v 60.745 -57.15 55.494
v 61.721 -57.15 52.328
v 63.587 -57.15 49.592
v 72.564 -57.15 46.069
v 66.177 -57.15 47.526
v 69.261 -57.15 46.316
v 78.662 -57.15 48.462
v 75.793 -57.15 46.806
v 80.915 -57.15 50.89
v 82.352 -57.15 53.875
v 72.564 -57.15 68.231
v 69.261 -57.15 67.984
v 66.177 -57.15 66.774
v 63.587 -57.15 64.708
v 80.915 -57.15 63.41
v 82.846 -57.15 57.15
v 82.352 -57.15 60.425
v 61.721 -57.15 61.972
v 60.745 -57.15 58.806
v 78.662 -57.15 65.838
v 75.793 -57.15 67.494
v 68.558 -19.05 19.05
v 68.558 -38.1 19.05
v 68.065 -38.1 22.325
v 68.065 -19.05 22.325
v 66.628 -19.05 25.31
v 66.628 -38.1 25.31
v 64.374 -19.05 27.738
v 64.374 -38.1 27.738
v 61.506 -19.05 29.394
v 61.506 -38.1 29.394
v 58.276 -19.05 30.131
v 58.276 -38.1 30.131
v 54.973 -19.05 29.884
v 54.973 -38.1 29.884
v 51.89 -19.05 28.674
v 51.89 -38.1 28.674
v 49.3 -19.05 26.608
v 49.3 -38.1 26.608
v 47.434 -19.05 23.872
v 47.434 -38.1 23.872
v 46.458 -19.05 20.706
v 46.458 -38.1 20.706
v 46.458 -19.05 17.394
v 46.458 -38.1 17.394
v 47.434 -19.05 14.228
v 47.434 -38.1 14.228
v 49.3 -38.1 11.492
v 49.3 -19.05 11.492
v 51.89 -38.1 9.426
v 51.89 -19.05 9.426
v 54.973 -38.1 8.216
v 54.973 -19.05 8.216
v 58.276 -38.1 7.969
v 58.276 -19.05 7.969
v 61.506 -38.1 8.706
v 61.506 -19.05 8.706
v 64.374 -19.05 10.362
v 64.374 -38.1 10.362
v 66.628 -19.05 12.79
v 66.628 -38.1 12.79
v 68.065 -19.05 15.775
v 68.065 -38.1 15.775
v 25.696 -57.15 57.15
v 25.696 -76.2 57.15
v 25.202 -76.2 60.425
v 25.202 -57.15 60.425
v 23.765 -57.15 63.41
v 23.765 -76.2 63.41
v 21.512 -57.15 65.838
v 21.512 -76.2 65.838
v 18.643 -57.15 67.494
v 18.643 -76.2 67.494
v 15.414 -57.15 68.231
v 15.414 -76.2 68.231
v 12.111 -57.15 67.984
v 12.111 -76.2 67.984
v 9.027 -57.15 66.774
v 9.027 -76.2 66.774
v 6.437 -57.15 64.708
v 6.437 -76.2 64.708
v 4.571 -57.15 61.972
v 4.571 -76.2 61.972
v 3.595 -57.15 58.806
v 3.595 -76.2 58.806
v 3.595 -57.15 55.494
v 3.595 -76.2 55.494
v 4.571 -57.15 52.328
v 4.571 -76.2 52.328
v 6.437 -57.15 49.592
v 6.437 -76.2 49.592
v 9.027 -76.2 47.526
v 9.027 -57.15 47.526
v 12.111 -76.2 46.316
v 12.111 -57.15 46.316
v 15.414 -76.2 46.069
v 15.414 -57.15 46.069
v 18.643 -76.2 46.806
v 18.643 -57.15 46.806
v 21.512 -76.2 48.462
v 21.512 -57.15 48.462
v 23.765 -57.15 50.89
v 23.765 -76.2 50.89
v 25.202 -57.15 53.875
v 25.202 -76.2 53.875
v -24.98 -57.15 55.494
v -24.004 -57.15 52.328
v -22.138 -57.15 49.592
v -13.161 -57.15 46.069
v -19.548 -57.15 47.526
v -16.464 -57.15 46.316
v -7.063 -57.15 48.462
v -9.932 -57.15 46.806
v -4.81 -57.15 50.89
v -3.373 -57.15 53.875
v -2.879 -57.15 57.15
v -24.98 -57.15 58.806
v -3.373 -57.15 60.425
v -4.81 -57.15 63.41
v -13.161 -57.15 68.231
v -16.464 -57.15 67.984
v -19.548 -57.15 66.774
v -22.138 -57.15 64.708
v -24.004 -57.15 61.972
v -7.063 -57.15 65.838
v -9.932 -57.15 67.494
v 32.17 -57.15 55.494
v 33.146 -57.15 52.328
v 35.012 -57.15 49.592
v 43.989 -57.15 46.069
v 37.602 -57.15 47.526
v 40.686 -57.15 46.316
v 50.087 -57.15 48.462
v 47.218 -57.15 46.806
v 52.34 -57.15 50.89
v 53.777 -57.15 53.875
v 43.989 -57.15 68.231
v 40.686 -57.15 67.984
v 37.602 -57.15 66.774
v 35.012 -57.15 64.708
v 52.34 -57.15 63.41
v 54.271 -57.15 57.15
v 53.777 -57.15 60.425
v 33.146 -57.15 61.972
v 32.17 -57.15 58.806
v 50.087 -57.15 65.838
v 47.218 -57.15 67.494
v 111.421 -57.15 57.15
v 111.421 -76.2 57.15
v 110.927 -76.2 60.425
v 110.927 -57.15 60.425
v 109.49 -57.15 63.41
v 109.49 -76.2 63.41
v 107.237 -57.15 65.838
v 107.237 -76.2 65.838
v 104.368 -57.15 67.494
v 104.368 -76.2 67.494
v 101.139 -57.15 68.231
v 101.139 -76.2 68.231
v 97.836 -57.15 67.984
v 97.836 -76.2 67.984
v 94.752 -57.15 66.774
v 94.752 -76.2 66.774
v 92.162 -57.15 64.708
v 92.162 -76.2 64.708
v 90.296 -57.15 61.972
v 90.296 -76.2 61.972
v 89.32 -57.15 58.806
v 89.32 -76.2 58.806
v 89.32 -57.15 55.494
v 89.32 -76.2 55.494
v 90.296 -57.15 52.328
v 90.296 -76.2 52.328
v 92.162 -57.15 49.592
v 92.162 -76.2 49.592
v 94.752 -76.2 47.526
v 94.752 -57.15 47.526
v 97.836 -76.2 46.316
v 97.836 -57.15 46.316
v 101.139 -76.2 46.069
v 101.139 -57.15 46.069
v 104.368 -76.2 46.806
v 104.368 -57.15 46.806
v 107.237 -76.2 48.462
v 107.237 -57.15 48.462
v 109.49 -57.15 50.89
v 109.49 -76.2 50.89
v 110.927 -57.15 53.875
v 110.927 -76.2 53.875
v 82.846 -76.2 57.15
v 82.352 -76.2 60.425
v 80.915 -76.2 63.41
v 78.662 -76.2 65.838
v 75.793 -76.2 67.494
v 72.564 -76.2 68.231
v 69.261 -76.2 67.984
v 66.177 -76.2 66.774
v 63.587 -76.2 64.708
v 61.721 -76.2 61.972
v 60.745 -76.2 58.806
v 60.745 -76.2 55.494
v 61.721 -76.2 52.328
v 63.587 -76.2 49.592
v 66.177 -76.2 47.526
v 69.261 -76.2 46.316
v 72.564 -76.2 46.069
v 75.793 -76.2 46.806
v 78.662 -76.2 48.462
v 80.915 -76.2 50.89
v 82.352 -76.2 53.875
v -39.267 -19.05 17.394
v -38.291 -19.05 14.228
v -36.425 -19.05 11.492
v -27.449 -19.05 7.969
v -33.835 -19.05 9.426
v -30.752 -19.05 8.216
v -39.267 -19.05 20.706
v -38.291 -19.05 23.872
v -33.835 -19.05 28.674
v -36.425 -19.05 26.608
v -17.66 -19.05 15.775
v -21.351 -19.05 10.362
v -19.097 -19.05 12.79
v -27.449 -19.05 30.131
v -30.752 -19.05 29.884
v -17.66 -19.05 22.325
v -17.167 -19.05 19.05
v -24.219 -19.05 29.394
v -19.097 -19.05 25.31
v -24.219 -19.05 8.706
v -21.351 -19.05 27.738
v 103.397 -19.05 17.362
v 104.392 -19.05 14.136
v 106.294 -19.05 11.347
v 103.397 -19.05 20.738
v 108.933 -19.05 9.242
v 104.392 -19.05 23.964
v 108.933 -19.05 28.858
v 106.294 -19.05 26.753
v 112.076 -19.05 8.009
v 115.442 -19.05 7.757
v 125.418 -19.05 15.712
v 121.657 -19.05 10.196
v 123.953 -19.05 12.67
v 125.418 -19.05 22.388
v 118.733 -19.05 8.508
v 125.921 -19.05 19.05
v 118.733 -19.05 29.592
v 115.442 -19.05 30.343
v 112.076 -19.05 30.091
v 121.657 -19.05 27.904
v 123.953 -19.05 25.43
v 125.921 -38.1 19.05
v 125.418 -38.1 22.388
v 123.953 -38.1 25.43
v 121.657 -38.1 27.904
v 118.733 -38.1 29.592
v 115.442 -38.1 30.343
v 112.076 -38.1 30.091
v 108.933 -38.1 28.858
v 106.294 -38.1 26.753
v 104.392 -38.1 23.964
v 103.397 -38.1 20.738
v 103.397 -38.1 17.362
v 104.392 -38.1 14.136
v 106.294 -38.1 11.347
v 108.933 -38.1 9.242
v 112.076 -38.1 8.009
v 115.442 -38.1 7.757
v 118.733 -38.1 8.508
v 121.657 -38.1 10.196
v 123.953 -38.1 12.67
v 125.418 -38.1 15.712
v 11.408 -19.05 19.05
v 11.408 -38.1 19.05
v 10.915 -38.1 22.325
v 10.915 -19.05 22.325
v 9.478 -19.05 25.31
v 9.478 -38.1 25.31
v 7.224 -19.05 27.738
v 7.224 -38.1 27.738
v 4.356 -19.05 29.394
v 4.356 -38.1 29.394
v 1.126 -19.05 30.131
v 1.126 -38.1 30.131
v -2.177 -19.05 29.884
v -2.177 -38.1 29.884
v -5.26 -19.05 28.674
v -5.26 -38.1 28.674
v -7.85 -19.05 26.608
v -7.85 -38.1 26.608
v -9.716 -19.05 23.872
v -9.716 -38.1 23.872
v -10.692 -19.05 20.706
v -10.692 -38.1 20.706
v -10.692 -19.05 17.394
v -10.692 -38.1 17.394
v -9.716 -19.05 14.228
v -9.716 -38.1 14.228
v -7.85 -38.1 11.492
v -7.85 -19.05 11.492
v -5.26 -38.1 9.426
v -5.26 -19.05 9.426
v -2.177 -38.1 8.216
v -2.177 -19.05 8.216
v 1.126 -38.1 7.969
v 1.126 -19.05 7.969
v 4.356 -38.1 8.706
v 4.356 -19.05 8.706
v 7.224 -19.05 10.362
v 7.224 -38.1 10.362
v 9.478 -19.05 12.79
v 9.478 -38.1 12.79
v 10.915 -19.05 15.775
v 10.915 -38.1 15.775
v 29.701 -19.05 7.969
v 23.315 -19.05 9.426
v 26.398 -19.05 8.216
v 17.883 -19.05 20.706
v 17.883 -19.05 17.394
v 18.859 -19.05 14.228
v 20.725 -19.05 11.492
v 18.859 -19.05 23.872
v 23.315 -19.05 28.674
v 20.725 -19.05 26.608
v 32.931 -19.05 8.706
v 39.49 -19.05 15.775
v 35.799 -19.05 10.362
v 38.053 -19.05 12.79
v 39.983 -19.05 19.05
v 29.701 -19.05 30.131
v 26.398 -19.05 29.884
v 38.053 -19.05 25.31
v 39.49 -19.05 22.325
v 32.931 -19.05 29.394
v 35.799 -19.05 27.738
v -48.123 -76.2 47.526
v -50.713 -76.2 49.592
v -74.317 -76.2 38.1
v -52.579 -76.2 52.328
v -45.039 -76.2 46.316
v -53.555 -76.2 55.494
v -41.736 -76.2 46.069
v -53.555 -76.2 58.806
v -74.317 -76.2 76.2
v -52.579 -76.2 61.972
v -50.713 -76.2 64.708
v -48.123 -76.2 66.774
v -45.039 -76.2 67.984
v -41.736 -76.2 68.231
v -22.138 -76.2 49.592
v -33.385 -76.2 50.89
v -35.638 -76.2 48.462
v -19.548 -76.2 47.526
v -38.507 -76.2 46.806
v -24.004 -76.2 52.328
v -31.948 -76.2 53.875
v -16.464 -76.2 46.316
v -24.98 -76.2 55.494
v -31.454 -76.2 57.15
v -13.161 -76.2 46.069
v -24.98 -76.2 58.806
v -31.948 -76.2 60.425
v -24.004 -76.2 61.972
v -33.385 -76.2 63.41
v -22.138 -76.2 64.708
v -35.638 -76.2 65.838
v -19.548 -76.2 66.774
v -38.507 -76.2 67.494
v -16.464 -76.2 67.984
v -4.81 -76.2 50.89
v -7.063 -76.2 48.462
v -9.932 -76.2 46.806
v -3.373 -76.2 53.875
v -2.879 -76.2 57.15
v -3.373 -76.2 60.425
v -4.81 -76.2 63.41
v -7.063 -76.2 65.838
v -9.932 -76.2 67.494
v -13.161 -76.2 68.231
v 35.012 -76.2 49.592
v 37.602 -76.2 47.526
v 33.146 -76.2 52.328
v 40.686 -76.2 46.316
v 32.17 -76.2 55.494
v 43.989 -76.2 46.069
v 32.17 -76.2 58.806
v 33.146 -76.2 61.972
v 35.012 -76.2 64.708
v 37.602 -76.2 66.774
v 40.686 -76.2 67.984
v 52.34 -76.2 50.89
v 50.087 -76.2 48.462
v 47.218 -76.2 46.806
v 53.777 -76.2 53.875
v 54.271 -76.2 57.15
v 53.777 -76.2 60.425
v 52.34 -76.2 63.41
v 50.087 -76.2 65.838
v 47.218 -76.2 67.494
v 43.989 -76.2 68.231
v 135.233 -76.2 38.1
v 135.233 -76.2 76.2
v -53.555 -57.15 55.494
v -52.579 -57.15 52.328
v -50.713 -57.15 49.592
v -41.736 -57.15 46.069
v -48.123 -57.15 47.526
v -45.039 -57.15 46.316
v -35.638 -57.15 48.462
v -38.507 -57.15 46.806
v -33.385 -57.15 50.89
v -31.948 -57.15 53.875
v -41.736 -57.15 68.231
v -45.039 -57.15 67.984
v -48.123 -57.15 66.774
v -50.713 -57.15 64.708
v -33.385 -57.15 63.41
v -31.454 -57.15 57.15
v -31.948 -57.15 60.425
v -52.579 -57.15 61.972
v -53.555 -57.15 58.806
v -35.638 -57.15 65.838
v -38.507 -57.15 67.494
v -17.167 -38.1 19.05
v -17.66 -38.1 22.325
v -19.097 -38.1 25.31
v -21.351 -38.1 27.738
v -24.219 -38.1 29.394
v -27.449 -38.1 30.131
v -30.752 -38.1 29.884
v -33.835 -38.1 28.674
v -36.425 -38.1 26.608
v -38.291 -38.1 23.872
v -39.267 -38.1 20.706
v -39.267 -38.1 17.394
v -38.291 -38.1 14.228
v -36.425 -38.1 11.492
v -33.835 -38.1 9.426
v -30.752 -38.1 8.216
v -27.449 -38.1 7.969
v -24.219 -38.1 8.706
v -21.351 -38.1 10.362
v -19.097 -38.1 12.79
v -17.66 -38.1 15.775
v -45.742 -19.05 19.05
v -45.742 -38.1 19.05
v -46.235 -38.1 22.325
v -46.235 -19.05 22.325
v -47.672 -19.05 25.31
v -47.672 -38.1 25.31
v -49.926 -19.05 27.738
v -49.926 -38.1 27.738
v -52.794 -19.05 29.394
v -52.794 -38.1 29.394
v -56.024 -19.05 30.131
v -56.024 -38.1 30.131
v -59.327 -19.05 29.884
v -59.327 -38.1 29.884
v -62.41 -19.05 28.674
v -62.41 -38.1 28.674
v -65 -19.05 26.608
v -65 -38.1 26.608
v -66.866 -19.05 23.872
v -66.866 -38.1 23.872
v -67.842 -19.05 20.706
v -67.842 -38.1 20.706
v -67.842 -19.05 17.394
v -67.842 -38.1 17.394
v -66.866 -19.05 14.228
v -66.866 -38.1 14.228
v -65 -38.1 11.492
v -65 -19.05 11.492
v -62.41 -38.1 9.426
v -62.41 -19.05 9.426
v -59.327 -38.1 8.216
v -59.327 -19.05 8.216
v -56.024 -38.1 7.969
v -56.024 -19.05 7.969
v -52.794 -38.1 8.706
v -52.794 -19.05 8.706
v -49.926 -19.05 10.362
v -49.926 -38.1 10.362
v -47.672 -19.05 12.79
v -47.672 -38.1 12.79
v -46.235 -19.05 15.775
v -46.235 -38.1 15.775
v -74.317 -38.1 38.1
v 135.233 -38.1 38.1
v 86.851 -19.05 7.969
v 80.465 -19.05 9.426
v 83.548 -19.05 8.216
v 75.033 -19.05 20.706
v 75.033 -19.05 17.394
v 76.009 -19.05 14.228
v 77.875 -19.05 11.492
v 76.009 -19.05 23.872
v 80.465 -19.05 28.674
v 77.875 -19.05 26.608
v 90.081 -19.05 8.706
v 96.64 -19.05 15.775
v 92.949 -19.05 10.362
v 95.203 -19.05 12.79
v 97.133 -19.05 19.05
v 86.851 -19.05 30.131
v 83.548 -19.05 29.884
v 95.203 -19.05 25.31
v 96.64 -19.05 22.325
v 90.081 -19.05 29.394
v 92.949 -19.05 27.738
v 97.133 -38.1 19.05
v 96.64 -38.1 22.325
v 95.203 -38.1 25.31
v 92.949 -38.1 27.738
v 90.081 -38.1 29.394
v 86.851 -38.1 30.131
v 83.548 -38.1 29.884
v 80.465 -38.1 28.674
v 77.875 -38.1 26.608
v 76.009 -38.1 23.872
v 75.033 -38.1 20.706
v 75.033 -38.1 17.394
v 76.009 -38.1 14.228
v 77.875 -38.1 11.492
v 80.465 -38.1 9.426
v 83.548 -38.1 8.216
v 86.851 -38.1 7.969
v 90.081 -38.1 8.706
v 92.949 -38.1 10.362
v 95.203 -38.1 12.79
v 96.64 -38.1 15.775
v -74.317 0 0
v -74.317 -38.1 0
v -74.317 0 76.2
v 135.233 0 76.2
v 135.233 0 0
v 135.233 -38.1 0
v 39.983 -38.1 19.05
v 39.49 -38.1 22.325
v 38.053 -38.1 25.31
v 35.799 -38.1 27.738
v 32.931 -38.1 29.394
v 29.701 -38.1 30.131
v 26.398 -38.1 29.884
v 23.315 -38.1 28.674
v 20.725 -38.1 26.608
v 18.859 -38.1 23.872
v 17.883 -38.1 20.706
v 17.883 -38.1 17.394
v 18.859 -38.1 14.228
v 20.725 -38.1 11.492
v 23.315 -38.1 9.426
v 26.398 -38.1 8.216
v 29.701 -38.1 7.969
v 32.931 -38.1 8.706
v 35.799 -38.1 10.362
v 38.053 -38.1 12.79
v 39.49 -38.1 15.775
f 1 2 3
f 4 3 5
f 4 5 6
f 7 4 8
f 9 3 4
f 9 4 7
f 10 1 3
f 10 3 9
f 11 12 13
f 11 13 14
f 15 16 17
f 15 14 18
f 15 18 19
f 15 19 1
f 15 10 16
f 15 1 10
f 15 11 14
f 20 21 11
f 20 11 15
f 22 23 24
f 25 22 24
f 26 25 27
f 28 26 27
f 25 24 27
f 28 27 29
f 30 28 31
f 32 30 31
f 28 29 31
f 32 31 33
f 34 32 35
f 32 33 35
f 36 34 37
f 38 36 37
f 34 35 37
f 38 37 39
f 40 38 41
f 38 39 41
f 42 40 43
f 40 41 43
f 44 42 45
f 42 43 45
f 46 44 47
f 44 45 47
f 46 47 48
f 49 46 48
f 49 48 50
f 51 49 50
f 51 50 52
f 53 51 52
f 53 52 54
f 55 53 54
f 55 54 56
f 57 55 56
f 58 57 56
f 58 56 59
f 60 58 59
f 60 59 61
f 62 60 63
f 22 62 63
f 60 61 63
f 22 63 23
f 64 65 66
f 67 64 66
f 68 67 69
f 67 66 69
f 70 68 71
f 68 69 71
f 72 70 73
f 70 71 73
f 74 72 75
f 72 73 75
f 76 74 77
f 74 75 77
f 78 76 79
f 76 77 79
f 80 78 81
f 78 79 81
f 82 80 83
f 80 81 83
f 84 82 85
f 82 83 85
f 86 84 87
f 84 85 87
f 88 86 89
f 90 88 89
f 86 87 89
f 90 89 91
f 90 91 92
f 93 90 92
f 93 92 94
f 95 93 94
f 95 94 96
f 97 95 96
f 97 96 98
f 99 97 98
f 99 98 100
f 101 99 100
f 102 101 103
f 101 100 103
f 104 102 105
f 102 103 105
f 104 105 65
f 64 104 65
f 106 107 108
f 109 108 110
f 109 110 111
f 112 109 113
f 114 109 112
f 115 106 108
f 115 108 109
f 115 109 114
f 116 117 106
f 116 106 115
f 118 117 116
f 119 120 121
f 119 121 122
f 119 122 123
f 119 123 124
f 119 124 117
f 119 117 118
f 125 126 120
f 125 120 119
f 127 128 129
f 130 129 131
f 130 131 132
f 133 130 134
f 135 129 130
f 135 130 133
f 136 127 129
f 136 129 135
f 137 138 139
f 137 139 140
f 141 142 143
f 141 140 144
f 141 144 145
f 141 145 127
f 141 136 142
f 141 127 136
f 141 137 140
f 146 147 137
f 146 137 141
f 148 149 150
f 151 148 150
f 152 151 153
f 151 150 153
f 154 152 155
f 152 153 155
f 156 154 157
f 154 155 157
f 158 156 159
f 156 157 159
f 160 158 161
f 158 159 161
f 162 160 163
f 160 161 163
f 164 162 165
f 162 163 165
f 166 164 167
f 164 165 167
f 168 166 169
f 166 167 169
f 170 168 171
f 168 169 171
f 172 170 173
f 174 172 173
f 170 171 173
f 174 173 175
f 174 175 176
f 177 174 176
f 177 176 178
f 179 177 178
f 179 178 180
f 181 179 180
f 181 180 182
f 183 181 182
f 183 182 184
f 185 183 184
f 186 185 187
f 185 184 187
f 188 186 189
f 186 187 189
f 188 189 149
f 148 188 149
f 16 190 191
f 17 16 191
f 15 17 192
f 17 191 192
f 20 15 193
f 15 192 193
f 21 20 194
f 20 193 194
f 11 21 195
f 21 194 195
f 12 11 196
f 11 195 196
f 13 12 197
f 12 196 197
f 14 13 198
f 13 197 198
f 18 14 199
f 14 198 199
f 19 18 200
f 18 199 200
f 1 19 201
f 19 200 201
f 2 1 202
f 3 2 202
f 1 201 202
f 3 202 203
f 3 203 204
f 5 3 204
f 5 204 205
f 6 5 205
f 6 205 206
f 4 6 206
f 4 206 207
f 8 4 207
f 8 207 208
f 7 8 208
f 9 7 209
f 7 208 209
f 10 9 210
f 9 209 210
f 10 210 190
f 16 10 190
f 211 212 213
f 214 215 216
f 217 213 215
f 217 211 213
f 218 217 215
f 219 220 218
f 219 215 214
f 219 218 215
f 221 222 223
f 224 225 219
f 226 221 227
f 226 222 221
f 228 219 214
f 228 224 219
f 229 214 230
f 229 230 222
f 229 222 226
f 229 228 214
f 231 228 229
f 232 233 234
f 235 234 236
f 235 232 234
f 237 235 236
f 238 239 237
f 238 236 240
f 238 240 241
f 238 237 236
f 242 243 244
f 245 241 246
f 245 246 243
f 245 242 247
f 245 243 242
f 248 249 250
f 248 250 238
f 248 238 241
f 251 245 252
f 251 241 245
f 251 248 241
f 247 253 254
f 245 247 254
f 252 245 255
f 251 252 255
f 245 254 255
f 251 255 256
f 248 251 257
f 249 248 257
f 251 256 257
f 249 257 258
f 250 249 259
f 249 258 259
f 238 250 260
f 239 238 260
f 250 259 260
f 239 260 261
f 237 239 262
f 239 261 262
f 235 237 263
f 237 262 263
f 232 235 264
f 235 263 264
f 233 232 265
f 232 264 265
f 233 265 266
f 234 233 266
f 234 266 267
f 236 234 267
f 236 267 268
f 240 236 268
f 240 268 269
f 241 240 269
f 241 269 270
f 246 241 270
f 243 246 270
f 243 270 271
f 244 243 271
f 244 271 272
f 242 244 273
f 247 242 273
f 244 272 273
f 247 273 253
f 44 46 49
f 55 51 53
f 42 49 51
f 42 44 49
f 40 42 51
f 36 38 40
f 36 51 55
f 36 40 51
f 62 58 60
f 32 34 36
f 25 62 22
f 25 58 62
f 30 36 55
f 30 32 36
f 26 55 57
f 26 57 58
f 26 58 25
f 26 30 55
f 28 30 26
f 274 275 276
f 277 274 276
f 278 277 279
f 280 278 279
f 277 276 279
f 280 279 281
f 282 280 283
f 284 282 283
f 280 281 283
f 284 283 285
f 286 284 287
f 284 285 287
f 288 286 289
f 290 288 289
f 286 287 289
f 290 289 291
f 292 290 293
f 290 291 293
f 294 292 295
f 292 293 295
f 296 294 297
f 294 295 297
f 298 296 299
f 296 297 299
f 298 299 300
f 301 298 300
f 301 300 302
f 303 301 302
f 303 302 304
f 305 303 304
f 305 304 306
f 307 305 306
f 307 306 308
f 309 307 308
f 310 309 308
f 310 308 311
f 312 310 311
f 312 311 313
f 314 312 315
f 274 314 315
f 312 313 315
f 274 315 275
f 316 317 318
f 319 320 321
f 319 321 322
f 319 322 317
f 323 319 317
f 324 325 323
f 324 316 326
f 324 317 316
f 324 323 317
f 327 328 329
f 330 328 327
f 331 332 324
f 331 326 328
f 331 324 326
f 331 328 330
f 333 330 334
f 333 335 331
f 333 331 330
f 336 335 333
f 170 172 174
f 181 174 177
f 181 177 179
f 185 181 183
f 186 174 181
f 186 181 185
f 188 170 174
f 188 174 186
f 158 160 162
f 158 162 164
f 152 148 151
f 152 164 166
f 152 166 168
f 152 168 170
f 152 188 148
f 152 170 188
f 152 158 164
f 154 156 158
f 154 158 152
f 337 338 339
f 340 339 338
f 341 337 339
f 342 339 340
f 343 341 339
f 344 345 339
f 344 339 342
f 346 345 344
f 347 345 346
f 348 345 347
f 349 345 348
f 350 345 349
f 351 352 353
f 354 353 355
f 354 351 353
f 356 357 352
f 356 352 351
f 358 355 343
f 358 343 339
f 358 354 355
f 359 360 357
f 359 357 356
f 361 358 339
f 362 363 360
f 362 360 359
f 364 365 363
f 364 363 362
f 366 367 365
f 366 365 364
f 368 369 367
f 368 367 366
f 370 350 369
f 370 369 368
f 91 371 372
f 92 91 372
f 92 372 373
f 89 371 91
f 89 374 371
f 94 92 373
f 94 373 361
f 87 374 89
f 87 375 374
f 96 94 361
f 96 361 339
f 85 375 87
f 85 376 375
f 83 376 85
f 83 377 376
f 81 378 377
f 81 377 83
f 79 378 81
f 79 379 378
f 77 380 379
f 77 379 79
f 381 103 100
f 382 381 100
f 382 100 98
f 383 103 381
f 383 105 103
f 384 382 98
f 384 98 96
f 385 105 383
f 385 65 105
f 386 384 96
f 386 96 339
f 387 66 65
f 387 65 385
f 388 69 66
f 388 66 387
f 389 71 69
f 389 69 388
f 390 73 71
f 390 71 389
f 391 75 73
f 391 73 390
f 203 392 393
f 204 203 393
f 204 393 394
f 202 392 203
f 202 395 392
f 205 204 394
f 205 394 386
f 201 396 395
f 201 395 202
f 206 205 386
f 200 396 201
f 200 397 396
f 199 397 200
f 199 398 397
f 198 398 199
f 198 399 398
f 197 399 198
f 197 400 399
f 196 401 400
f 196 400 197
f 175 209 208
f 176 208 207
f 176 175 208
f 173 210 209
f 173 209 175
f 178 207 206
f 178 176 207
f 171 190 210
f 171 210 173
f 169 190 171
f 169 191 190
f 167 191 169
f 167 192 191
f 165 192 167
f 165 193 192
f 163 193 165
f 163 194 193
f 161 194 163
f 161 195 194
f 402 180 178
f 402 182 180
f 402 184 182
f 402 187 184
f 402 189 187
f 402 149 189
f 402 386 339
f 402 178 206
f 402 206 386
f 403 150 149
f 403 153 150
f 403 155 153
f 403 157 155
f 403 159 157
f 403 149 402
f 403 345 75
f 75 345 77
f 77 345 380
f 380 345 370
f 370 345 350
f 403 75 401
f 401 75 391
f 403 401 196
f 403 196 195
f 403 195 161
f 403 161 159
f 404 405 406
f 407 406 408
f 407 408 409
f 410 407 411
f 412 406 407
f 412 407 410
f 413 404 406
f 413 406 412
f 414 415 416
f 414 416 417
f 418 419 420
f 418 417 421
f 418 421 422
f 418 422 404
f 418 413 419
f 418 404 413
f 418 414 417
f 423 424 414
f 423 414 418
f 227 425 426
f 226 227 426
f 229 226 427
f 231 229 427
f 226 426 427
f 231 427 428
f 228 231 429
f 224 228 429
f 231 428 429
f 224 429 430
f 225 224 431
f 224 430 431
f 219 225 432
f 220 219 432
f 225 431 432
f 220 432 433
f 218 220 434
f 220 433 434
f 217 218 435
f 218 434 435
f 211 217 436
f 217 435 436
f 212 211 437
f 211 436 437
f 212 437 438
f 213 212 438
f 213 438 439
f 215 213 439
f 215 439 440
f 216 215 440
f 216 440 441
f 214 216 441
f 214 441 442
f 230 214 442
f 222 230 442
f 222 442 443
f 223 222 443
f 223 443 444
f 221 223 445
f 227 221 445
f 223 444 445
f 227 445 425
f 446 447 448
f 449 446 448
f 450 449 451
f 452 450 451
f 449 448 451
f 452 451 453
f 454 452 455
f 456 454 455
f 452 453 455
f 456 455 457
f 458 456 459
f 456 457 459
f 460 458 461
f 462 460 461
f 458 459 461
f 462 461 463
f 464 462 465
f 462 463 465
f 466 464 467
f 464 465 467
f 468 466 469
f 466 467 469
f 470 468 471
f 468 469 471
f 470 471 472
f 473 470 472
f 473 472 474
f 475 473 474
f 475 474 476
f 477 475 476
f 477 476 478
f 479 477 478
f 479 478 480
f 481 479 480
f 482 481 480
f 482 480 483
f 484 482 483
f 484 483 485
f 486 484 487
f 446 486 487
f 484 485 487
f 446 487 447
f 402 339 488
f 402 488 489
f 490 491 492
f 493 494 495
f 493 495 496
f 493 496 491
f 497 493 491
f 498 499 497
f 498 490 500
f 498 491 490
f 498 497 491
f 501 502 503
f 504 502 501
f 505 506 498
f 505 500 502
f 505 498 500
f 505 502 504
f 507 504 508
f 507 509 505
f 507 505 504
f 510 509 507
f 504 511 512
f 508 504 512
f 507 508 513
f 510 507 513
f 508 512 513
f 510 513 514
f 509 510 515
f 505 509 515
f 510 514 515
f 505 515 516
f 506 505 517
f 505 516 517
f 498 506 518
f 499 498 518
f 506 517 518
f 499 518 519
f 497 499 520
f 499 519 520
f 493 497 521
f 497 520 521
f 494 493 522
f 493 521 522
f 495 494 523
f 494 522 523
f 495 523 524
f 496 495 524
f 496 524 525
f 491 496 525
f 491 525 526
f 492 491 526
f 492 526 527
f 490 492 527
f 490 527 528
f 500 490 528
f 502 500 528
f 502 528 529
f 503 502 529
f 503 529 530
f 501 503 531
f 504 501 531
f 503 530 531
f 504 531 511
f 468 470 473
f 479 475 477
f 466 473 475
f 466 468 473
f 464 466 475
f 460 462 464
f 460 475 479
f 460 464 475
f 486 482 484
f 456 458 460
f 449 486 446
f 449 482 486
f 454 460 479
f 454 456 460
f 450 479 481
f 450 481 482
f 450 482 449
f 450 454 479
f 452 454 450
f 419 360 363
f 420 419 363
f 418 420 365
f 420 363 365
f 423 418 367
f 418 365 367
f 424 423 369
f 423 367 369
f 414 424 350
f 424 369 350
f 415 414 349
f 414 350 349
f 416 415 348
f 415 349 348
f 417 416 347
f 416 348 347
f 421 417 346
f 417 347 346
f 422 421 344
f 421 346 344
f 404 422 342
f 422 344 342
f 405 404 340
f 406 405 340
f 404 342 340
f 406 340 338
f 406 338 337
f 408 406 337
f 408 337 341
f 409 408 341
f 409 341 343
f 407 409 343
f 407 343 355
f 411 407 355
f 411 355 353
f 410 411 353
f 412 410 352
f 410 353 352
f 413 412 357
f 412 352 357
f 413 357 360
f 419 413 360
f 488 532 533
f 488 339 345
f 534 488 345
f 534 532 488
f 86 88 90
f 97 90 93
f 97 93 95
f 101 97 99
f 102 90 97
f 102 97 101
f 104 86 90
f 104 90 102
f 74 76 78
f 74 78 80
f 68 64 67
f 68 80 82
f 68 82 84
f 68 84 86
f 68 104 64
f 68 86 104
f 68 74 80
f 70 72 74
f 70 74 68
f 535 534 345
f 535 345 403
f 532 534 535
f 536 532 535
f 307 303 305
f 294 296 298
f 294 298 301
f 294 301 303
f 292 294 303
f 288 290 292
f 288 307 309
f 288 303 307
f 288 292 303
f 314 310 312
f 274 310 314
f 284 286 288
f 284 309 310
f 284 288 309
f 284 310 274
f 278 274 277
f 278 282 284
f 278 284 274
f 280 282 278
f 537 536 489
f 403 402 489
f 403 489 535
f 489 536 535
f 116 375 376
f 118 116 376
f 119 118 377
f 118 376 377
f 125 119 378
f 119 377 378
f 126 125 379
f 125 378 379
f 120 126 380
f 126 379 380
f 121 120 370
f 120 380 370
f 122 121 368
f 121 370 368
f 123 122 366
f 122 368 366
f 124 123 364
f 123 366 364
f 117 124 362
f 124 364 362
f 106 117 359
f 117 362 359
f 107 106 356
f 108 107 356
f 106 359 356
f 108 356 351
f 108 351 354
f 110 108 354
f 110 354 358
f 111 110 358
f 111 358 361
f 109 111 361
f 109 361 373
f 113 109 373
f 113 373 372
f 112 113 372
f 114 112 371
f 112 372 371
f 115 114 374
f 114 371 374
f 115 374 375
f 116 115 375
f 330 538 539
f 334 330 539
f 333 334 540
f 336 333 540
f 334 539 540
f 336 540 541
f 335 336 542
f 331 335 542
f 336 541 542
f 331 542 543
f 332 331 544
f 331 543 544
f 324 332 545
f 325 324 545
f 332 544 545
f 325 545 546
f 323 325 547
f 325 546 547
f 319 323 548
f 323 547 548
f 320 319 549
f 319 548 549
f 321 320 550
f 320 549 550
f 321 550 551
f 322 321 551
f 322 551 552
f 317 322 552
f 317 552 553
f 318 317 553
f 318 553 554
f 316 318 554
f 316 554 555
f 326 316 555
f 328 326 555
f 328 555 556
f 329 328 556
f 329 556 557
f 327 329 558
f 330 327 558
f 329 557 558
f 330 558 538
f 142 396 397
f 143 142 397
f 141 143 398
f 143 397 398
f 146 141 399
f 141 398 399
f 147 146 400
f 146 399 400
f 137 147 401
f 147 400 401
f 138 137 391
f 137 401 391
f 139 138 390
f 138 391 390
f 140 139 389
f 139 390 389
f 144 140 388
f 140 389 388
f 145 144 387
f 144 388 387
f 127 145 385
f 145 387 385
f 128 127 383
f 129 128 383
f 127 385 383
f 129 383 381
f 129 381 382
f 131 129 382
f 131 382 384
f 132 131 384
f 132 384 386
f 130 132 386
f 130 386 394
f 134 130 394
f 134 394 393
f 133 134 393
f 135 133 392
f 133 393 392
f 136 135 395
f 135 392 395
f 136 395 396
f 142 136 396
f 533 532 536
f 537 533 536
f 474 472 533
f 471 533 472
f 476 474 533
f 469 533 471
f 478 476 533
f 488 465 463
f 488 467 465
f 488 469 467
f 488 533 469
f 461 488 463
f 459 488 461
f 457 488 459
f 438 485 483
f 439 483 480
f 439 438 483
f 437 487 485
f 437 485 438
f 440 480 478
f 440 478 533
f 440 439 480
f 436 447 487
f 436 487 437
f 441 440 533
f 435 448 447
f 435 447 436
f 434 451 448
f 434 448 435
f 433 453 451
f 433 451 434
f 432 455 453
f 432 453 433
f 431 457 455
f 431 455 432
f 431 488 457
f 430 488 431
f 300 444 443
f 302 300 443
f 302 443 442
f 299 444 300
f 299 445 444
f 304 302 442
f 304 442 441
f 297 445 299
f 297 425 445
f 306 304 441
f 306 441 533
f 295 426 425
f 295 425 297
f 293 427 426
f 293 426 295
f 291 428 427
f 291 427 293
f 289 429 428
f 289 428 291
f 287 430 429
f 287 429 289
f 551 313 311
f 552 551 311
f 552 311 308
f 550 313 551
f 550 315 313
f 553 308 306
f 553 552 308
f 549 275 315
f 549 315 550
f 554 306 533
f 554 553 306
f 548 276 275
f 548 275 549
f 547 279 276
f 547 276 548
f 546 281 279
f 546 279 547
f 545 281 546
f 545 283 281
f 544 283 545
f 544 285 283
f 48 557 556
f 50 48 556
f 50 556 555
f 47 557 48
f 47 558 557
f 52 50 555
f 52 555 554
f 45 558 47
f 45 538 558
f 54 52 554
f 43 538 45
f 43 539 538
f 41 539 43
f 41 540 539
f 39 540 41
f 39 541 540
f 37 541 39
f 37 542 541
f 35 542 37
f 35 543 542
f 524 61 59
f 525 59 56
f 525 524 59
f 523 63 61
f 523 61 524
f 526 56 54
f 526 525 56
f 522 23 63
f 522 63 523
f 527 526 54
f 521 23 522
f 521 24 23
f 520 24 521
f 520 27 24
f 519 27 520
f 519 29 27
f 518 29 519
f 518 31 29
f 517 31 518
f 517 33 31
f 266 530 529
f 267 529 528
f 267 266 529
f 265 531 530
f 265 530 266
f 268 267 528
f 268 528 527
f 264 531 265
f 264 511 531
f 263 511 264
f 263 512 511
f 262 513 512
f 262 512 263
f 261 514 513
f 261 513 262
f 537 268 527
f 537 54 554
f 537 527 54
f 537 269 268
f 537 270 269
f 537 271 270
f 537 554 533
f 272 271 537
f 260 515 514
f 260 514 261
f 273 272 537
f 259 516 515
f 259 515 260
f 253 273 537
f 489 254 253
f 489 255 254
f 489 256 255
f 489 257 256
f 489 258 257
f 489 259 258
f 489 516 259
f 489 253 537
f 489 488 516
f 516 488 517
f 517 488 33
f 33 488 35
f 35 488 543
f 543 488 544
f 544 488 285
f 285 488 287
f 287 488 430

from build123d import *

# Parameters (mm, degrees)
F0_W     = 209.55
F0_H     = 76.2
F1_DEPTH = 76.2
F2_W     = 209.55
F2_H     = 38.1
F3_DEPTH = 38.1
F4_R     = 11.1125
F4_R_2   = 11.325083
F5_DEPTH = 19.05
F6_R     = 11.1125
F7_DEPTH = 19.05


with BuildPart() as f1:
    # F0 (on Front) → F1 (new body)
    with BuildSketch(Plane.XZ):
        with Locations((30.458469, 38.1)):
            Rectangle(F0_W, F0_H)
    extrude(amount=F1_DEPTH)

    # F2 (on face) → F3 (cut)
    with BuildSketch(Plane.XZ.offset(76.2)):
        with Locations((30.458469, 19.05)):
            Rectangle(F2_W, F2_H)
    extrude(amount=-F3_DEPTH, mode=Mode.SUBTRACT)

    # F4 (on face) → F5 (cut)
    with BuildSketch(Plane.XZ.offset(38.1)):
        with Locations((-56.854031, 19.05)):
            Circle(F4_R)
        with Locations((-28.279031, 19.05)):
            Circle(F4_R)
        with Locations((0.295969, 19.05)):
            Circle(F4_R)
        with Locations((57.445969, 19.05)):
            Circle(F4_R)
        with Locations((86.020969, 19.05)):
            Circle(F4_R)
        with Locations((114.595969, 19.05)):
            Circle(F4_R_2)
        with Locations((28.870969, 19.05)):
            Circle(F4_R)
    extrude(amount=-F5_DEPTH, mode=Mode.SUBTRACT)

    # F6 (on face) → F7 (cut)
    with BuildSketch(Plane.XZ.offset(76.2)):
        with Locations((-42.566531, 57.15)):
            Circle(F6_R)
        with Locations((-13.991531, 57.15)):
            Circle(F6_R)
        with Locations((14.583469, 57.15)):
            Circle(F6_R)
        with Locations((43.158469, 57.15)):
            Circle(F6_R)
        with Locations((71.733469, 57.15)):
            Circle(F6_R)
        with Locations((100.308469, 57.15)):
            Circle(F6_R)
    extrude(amount=-F7_DEPTH, mode=Mode.SUBTRACT)


solid = f1.part
